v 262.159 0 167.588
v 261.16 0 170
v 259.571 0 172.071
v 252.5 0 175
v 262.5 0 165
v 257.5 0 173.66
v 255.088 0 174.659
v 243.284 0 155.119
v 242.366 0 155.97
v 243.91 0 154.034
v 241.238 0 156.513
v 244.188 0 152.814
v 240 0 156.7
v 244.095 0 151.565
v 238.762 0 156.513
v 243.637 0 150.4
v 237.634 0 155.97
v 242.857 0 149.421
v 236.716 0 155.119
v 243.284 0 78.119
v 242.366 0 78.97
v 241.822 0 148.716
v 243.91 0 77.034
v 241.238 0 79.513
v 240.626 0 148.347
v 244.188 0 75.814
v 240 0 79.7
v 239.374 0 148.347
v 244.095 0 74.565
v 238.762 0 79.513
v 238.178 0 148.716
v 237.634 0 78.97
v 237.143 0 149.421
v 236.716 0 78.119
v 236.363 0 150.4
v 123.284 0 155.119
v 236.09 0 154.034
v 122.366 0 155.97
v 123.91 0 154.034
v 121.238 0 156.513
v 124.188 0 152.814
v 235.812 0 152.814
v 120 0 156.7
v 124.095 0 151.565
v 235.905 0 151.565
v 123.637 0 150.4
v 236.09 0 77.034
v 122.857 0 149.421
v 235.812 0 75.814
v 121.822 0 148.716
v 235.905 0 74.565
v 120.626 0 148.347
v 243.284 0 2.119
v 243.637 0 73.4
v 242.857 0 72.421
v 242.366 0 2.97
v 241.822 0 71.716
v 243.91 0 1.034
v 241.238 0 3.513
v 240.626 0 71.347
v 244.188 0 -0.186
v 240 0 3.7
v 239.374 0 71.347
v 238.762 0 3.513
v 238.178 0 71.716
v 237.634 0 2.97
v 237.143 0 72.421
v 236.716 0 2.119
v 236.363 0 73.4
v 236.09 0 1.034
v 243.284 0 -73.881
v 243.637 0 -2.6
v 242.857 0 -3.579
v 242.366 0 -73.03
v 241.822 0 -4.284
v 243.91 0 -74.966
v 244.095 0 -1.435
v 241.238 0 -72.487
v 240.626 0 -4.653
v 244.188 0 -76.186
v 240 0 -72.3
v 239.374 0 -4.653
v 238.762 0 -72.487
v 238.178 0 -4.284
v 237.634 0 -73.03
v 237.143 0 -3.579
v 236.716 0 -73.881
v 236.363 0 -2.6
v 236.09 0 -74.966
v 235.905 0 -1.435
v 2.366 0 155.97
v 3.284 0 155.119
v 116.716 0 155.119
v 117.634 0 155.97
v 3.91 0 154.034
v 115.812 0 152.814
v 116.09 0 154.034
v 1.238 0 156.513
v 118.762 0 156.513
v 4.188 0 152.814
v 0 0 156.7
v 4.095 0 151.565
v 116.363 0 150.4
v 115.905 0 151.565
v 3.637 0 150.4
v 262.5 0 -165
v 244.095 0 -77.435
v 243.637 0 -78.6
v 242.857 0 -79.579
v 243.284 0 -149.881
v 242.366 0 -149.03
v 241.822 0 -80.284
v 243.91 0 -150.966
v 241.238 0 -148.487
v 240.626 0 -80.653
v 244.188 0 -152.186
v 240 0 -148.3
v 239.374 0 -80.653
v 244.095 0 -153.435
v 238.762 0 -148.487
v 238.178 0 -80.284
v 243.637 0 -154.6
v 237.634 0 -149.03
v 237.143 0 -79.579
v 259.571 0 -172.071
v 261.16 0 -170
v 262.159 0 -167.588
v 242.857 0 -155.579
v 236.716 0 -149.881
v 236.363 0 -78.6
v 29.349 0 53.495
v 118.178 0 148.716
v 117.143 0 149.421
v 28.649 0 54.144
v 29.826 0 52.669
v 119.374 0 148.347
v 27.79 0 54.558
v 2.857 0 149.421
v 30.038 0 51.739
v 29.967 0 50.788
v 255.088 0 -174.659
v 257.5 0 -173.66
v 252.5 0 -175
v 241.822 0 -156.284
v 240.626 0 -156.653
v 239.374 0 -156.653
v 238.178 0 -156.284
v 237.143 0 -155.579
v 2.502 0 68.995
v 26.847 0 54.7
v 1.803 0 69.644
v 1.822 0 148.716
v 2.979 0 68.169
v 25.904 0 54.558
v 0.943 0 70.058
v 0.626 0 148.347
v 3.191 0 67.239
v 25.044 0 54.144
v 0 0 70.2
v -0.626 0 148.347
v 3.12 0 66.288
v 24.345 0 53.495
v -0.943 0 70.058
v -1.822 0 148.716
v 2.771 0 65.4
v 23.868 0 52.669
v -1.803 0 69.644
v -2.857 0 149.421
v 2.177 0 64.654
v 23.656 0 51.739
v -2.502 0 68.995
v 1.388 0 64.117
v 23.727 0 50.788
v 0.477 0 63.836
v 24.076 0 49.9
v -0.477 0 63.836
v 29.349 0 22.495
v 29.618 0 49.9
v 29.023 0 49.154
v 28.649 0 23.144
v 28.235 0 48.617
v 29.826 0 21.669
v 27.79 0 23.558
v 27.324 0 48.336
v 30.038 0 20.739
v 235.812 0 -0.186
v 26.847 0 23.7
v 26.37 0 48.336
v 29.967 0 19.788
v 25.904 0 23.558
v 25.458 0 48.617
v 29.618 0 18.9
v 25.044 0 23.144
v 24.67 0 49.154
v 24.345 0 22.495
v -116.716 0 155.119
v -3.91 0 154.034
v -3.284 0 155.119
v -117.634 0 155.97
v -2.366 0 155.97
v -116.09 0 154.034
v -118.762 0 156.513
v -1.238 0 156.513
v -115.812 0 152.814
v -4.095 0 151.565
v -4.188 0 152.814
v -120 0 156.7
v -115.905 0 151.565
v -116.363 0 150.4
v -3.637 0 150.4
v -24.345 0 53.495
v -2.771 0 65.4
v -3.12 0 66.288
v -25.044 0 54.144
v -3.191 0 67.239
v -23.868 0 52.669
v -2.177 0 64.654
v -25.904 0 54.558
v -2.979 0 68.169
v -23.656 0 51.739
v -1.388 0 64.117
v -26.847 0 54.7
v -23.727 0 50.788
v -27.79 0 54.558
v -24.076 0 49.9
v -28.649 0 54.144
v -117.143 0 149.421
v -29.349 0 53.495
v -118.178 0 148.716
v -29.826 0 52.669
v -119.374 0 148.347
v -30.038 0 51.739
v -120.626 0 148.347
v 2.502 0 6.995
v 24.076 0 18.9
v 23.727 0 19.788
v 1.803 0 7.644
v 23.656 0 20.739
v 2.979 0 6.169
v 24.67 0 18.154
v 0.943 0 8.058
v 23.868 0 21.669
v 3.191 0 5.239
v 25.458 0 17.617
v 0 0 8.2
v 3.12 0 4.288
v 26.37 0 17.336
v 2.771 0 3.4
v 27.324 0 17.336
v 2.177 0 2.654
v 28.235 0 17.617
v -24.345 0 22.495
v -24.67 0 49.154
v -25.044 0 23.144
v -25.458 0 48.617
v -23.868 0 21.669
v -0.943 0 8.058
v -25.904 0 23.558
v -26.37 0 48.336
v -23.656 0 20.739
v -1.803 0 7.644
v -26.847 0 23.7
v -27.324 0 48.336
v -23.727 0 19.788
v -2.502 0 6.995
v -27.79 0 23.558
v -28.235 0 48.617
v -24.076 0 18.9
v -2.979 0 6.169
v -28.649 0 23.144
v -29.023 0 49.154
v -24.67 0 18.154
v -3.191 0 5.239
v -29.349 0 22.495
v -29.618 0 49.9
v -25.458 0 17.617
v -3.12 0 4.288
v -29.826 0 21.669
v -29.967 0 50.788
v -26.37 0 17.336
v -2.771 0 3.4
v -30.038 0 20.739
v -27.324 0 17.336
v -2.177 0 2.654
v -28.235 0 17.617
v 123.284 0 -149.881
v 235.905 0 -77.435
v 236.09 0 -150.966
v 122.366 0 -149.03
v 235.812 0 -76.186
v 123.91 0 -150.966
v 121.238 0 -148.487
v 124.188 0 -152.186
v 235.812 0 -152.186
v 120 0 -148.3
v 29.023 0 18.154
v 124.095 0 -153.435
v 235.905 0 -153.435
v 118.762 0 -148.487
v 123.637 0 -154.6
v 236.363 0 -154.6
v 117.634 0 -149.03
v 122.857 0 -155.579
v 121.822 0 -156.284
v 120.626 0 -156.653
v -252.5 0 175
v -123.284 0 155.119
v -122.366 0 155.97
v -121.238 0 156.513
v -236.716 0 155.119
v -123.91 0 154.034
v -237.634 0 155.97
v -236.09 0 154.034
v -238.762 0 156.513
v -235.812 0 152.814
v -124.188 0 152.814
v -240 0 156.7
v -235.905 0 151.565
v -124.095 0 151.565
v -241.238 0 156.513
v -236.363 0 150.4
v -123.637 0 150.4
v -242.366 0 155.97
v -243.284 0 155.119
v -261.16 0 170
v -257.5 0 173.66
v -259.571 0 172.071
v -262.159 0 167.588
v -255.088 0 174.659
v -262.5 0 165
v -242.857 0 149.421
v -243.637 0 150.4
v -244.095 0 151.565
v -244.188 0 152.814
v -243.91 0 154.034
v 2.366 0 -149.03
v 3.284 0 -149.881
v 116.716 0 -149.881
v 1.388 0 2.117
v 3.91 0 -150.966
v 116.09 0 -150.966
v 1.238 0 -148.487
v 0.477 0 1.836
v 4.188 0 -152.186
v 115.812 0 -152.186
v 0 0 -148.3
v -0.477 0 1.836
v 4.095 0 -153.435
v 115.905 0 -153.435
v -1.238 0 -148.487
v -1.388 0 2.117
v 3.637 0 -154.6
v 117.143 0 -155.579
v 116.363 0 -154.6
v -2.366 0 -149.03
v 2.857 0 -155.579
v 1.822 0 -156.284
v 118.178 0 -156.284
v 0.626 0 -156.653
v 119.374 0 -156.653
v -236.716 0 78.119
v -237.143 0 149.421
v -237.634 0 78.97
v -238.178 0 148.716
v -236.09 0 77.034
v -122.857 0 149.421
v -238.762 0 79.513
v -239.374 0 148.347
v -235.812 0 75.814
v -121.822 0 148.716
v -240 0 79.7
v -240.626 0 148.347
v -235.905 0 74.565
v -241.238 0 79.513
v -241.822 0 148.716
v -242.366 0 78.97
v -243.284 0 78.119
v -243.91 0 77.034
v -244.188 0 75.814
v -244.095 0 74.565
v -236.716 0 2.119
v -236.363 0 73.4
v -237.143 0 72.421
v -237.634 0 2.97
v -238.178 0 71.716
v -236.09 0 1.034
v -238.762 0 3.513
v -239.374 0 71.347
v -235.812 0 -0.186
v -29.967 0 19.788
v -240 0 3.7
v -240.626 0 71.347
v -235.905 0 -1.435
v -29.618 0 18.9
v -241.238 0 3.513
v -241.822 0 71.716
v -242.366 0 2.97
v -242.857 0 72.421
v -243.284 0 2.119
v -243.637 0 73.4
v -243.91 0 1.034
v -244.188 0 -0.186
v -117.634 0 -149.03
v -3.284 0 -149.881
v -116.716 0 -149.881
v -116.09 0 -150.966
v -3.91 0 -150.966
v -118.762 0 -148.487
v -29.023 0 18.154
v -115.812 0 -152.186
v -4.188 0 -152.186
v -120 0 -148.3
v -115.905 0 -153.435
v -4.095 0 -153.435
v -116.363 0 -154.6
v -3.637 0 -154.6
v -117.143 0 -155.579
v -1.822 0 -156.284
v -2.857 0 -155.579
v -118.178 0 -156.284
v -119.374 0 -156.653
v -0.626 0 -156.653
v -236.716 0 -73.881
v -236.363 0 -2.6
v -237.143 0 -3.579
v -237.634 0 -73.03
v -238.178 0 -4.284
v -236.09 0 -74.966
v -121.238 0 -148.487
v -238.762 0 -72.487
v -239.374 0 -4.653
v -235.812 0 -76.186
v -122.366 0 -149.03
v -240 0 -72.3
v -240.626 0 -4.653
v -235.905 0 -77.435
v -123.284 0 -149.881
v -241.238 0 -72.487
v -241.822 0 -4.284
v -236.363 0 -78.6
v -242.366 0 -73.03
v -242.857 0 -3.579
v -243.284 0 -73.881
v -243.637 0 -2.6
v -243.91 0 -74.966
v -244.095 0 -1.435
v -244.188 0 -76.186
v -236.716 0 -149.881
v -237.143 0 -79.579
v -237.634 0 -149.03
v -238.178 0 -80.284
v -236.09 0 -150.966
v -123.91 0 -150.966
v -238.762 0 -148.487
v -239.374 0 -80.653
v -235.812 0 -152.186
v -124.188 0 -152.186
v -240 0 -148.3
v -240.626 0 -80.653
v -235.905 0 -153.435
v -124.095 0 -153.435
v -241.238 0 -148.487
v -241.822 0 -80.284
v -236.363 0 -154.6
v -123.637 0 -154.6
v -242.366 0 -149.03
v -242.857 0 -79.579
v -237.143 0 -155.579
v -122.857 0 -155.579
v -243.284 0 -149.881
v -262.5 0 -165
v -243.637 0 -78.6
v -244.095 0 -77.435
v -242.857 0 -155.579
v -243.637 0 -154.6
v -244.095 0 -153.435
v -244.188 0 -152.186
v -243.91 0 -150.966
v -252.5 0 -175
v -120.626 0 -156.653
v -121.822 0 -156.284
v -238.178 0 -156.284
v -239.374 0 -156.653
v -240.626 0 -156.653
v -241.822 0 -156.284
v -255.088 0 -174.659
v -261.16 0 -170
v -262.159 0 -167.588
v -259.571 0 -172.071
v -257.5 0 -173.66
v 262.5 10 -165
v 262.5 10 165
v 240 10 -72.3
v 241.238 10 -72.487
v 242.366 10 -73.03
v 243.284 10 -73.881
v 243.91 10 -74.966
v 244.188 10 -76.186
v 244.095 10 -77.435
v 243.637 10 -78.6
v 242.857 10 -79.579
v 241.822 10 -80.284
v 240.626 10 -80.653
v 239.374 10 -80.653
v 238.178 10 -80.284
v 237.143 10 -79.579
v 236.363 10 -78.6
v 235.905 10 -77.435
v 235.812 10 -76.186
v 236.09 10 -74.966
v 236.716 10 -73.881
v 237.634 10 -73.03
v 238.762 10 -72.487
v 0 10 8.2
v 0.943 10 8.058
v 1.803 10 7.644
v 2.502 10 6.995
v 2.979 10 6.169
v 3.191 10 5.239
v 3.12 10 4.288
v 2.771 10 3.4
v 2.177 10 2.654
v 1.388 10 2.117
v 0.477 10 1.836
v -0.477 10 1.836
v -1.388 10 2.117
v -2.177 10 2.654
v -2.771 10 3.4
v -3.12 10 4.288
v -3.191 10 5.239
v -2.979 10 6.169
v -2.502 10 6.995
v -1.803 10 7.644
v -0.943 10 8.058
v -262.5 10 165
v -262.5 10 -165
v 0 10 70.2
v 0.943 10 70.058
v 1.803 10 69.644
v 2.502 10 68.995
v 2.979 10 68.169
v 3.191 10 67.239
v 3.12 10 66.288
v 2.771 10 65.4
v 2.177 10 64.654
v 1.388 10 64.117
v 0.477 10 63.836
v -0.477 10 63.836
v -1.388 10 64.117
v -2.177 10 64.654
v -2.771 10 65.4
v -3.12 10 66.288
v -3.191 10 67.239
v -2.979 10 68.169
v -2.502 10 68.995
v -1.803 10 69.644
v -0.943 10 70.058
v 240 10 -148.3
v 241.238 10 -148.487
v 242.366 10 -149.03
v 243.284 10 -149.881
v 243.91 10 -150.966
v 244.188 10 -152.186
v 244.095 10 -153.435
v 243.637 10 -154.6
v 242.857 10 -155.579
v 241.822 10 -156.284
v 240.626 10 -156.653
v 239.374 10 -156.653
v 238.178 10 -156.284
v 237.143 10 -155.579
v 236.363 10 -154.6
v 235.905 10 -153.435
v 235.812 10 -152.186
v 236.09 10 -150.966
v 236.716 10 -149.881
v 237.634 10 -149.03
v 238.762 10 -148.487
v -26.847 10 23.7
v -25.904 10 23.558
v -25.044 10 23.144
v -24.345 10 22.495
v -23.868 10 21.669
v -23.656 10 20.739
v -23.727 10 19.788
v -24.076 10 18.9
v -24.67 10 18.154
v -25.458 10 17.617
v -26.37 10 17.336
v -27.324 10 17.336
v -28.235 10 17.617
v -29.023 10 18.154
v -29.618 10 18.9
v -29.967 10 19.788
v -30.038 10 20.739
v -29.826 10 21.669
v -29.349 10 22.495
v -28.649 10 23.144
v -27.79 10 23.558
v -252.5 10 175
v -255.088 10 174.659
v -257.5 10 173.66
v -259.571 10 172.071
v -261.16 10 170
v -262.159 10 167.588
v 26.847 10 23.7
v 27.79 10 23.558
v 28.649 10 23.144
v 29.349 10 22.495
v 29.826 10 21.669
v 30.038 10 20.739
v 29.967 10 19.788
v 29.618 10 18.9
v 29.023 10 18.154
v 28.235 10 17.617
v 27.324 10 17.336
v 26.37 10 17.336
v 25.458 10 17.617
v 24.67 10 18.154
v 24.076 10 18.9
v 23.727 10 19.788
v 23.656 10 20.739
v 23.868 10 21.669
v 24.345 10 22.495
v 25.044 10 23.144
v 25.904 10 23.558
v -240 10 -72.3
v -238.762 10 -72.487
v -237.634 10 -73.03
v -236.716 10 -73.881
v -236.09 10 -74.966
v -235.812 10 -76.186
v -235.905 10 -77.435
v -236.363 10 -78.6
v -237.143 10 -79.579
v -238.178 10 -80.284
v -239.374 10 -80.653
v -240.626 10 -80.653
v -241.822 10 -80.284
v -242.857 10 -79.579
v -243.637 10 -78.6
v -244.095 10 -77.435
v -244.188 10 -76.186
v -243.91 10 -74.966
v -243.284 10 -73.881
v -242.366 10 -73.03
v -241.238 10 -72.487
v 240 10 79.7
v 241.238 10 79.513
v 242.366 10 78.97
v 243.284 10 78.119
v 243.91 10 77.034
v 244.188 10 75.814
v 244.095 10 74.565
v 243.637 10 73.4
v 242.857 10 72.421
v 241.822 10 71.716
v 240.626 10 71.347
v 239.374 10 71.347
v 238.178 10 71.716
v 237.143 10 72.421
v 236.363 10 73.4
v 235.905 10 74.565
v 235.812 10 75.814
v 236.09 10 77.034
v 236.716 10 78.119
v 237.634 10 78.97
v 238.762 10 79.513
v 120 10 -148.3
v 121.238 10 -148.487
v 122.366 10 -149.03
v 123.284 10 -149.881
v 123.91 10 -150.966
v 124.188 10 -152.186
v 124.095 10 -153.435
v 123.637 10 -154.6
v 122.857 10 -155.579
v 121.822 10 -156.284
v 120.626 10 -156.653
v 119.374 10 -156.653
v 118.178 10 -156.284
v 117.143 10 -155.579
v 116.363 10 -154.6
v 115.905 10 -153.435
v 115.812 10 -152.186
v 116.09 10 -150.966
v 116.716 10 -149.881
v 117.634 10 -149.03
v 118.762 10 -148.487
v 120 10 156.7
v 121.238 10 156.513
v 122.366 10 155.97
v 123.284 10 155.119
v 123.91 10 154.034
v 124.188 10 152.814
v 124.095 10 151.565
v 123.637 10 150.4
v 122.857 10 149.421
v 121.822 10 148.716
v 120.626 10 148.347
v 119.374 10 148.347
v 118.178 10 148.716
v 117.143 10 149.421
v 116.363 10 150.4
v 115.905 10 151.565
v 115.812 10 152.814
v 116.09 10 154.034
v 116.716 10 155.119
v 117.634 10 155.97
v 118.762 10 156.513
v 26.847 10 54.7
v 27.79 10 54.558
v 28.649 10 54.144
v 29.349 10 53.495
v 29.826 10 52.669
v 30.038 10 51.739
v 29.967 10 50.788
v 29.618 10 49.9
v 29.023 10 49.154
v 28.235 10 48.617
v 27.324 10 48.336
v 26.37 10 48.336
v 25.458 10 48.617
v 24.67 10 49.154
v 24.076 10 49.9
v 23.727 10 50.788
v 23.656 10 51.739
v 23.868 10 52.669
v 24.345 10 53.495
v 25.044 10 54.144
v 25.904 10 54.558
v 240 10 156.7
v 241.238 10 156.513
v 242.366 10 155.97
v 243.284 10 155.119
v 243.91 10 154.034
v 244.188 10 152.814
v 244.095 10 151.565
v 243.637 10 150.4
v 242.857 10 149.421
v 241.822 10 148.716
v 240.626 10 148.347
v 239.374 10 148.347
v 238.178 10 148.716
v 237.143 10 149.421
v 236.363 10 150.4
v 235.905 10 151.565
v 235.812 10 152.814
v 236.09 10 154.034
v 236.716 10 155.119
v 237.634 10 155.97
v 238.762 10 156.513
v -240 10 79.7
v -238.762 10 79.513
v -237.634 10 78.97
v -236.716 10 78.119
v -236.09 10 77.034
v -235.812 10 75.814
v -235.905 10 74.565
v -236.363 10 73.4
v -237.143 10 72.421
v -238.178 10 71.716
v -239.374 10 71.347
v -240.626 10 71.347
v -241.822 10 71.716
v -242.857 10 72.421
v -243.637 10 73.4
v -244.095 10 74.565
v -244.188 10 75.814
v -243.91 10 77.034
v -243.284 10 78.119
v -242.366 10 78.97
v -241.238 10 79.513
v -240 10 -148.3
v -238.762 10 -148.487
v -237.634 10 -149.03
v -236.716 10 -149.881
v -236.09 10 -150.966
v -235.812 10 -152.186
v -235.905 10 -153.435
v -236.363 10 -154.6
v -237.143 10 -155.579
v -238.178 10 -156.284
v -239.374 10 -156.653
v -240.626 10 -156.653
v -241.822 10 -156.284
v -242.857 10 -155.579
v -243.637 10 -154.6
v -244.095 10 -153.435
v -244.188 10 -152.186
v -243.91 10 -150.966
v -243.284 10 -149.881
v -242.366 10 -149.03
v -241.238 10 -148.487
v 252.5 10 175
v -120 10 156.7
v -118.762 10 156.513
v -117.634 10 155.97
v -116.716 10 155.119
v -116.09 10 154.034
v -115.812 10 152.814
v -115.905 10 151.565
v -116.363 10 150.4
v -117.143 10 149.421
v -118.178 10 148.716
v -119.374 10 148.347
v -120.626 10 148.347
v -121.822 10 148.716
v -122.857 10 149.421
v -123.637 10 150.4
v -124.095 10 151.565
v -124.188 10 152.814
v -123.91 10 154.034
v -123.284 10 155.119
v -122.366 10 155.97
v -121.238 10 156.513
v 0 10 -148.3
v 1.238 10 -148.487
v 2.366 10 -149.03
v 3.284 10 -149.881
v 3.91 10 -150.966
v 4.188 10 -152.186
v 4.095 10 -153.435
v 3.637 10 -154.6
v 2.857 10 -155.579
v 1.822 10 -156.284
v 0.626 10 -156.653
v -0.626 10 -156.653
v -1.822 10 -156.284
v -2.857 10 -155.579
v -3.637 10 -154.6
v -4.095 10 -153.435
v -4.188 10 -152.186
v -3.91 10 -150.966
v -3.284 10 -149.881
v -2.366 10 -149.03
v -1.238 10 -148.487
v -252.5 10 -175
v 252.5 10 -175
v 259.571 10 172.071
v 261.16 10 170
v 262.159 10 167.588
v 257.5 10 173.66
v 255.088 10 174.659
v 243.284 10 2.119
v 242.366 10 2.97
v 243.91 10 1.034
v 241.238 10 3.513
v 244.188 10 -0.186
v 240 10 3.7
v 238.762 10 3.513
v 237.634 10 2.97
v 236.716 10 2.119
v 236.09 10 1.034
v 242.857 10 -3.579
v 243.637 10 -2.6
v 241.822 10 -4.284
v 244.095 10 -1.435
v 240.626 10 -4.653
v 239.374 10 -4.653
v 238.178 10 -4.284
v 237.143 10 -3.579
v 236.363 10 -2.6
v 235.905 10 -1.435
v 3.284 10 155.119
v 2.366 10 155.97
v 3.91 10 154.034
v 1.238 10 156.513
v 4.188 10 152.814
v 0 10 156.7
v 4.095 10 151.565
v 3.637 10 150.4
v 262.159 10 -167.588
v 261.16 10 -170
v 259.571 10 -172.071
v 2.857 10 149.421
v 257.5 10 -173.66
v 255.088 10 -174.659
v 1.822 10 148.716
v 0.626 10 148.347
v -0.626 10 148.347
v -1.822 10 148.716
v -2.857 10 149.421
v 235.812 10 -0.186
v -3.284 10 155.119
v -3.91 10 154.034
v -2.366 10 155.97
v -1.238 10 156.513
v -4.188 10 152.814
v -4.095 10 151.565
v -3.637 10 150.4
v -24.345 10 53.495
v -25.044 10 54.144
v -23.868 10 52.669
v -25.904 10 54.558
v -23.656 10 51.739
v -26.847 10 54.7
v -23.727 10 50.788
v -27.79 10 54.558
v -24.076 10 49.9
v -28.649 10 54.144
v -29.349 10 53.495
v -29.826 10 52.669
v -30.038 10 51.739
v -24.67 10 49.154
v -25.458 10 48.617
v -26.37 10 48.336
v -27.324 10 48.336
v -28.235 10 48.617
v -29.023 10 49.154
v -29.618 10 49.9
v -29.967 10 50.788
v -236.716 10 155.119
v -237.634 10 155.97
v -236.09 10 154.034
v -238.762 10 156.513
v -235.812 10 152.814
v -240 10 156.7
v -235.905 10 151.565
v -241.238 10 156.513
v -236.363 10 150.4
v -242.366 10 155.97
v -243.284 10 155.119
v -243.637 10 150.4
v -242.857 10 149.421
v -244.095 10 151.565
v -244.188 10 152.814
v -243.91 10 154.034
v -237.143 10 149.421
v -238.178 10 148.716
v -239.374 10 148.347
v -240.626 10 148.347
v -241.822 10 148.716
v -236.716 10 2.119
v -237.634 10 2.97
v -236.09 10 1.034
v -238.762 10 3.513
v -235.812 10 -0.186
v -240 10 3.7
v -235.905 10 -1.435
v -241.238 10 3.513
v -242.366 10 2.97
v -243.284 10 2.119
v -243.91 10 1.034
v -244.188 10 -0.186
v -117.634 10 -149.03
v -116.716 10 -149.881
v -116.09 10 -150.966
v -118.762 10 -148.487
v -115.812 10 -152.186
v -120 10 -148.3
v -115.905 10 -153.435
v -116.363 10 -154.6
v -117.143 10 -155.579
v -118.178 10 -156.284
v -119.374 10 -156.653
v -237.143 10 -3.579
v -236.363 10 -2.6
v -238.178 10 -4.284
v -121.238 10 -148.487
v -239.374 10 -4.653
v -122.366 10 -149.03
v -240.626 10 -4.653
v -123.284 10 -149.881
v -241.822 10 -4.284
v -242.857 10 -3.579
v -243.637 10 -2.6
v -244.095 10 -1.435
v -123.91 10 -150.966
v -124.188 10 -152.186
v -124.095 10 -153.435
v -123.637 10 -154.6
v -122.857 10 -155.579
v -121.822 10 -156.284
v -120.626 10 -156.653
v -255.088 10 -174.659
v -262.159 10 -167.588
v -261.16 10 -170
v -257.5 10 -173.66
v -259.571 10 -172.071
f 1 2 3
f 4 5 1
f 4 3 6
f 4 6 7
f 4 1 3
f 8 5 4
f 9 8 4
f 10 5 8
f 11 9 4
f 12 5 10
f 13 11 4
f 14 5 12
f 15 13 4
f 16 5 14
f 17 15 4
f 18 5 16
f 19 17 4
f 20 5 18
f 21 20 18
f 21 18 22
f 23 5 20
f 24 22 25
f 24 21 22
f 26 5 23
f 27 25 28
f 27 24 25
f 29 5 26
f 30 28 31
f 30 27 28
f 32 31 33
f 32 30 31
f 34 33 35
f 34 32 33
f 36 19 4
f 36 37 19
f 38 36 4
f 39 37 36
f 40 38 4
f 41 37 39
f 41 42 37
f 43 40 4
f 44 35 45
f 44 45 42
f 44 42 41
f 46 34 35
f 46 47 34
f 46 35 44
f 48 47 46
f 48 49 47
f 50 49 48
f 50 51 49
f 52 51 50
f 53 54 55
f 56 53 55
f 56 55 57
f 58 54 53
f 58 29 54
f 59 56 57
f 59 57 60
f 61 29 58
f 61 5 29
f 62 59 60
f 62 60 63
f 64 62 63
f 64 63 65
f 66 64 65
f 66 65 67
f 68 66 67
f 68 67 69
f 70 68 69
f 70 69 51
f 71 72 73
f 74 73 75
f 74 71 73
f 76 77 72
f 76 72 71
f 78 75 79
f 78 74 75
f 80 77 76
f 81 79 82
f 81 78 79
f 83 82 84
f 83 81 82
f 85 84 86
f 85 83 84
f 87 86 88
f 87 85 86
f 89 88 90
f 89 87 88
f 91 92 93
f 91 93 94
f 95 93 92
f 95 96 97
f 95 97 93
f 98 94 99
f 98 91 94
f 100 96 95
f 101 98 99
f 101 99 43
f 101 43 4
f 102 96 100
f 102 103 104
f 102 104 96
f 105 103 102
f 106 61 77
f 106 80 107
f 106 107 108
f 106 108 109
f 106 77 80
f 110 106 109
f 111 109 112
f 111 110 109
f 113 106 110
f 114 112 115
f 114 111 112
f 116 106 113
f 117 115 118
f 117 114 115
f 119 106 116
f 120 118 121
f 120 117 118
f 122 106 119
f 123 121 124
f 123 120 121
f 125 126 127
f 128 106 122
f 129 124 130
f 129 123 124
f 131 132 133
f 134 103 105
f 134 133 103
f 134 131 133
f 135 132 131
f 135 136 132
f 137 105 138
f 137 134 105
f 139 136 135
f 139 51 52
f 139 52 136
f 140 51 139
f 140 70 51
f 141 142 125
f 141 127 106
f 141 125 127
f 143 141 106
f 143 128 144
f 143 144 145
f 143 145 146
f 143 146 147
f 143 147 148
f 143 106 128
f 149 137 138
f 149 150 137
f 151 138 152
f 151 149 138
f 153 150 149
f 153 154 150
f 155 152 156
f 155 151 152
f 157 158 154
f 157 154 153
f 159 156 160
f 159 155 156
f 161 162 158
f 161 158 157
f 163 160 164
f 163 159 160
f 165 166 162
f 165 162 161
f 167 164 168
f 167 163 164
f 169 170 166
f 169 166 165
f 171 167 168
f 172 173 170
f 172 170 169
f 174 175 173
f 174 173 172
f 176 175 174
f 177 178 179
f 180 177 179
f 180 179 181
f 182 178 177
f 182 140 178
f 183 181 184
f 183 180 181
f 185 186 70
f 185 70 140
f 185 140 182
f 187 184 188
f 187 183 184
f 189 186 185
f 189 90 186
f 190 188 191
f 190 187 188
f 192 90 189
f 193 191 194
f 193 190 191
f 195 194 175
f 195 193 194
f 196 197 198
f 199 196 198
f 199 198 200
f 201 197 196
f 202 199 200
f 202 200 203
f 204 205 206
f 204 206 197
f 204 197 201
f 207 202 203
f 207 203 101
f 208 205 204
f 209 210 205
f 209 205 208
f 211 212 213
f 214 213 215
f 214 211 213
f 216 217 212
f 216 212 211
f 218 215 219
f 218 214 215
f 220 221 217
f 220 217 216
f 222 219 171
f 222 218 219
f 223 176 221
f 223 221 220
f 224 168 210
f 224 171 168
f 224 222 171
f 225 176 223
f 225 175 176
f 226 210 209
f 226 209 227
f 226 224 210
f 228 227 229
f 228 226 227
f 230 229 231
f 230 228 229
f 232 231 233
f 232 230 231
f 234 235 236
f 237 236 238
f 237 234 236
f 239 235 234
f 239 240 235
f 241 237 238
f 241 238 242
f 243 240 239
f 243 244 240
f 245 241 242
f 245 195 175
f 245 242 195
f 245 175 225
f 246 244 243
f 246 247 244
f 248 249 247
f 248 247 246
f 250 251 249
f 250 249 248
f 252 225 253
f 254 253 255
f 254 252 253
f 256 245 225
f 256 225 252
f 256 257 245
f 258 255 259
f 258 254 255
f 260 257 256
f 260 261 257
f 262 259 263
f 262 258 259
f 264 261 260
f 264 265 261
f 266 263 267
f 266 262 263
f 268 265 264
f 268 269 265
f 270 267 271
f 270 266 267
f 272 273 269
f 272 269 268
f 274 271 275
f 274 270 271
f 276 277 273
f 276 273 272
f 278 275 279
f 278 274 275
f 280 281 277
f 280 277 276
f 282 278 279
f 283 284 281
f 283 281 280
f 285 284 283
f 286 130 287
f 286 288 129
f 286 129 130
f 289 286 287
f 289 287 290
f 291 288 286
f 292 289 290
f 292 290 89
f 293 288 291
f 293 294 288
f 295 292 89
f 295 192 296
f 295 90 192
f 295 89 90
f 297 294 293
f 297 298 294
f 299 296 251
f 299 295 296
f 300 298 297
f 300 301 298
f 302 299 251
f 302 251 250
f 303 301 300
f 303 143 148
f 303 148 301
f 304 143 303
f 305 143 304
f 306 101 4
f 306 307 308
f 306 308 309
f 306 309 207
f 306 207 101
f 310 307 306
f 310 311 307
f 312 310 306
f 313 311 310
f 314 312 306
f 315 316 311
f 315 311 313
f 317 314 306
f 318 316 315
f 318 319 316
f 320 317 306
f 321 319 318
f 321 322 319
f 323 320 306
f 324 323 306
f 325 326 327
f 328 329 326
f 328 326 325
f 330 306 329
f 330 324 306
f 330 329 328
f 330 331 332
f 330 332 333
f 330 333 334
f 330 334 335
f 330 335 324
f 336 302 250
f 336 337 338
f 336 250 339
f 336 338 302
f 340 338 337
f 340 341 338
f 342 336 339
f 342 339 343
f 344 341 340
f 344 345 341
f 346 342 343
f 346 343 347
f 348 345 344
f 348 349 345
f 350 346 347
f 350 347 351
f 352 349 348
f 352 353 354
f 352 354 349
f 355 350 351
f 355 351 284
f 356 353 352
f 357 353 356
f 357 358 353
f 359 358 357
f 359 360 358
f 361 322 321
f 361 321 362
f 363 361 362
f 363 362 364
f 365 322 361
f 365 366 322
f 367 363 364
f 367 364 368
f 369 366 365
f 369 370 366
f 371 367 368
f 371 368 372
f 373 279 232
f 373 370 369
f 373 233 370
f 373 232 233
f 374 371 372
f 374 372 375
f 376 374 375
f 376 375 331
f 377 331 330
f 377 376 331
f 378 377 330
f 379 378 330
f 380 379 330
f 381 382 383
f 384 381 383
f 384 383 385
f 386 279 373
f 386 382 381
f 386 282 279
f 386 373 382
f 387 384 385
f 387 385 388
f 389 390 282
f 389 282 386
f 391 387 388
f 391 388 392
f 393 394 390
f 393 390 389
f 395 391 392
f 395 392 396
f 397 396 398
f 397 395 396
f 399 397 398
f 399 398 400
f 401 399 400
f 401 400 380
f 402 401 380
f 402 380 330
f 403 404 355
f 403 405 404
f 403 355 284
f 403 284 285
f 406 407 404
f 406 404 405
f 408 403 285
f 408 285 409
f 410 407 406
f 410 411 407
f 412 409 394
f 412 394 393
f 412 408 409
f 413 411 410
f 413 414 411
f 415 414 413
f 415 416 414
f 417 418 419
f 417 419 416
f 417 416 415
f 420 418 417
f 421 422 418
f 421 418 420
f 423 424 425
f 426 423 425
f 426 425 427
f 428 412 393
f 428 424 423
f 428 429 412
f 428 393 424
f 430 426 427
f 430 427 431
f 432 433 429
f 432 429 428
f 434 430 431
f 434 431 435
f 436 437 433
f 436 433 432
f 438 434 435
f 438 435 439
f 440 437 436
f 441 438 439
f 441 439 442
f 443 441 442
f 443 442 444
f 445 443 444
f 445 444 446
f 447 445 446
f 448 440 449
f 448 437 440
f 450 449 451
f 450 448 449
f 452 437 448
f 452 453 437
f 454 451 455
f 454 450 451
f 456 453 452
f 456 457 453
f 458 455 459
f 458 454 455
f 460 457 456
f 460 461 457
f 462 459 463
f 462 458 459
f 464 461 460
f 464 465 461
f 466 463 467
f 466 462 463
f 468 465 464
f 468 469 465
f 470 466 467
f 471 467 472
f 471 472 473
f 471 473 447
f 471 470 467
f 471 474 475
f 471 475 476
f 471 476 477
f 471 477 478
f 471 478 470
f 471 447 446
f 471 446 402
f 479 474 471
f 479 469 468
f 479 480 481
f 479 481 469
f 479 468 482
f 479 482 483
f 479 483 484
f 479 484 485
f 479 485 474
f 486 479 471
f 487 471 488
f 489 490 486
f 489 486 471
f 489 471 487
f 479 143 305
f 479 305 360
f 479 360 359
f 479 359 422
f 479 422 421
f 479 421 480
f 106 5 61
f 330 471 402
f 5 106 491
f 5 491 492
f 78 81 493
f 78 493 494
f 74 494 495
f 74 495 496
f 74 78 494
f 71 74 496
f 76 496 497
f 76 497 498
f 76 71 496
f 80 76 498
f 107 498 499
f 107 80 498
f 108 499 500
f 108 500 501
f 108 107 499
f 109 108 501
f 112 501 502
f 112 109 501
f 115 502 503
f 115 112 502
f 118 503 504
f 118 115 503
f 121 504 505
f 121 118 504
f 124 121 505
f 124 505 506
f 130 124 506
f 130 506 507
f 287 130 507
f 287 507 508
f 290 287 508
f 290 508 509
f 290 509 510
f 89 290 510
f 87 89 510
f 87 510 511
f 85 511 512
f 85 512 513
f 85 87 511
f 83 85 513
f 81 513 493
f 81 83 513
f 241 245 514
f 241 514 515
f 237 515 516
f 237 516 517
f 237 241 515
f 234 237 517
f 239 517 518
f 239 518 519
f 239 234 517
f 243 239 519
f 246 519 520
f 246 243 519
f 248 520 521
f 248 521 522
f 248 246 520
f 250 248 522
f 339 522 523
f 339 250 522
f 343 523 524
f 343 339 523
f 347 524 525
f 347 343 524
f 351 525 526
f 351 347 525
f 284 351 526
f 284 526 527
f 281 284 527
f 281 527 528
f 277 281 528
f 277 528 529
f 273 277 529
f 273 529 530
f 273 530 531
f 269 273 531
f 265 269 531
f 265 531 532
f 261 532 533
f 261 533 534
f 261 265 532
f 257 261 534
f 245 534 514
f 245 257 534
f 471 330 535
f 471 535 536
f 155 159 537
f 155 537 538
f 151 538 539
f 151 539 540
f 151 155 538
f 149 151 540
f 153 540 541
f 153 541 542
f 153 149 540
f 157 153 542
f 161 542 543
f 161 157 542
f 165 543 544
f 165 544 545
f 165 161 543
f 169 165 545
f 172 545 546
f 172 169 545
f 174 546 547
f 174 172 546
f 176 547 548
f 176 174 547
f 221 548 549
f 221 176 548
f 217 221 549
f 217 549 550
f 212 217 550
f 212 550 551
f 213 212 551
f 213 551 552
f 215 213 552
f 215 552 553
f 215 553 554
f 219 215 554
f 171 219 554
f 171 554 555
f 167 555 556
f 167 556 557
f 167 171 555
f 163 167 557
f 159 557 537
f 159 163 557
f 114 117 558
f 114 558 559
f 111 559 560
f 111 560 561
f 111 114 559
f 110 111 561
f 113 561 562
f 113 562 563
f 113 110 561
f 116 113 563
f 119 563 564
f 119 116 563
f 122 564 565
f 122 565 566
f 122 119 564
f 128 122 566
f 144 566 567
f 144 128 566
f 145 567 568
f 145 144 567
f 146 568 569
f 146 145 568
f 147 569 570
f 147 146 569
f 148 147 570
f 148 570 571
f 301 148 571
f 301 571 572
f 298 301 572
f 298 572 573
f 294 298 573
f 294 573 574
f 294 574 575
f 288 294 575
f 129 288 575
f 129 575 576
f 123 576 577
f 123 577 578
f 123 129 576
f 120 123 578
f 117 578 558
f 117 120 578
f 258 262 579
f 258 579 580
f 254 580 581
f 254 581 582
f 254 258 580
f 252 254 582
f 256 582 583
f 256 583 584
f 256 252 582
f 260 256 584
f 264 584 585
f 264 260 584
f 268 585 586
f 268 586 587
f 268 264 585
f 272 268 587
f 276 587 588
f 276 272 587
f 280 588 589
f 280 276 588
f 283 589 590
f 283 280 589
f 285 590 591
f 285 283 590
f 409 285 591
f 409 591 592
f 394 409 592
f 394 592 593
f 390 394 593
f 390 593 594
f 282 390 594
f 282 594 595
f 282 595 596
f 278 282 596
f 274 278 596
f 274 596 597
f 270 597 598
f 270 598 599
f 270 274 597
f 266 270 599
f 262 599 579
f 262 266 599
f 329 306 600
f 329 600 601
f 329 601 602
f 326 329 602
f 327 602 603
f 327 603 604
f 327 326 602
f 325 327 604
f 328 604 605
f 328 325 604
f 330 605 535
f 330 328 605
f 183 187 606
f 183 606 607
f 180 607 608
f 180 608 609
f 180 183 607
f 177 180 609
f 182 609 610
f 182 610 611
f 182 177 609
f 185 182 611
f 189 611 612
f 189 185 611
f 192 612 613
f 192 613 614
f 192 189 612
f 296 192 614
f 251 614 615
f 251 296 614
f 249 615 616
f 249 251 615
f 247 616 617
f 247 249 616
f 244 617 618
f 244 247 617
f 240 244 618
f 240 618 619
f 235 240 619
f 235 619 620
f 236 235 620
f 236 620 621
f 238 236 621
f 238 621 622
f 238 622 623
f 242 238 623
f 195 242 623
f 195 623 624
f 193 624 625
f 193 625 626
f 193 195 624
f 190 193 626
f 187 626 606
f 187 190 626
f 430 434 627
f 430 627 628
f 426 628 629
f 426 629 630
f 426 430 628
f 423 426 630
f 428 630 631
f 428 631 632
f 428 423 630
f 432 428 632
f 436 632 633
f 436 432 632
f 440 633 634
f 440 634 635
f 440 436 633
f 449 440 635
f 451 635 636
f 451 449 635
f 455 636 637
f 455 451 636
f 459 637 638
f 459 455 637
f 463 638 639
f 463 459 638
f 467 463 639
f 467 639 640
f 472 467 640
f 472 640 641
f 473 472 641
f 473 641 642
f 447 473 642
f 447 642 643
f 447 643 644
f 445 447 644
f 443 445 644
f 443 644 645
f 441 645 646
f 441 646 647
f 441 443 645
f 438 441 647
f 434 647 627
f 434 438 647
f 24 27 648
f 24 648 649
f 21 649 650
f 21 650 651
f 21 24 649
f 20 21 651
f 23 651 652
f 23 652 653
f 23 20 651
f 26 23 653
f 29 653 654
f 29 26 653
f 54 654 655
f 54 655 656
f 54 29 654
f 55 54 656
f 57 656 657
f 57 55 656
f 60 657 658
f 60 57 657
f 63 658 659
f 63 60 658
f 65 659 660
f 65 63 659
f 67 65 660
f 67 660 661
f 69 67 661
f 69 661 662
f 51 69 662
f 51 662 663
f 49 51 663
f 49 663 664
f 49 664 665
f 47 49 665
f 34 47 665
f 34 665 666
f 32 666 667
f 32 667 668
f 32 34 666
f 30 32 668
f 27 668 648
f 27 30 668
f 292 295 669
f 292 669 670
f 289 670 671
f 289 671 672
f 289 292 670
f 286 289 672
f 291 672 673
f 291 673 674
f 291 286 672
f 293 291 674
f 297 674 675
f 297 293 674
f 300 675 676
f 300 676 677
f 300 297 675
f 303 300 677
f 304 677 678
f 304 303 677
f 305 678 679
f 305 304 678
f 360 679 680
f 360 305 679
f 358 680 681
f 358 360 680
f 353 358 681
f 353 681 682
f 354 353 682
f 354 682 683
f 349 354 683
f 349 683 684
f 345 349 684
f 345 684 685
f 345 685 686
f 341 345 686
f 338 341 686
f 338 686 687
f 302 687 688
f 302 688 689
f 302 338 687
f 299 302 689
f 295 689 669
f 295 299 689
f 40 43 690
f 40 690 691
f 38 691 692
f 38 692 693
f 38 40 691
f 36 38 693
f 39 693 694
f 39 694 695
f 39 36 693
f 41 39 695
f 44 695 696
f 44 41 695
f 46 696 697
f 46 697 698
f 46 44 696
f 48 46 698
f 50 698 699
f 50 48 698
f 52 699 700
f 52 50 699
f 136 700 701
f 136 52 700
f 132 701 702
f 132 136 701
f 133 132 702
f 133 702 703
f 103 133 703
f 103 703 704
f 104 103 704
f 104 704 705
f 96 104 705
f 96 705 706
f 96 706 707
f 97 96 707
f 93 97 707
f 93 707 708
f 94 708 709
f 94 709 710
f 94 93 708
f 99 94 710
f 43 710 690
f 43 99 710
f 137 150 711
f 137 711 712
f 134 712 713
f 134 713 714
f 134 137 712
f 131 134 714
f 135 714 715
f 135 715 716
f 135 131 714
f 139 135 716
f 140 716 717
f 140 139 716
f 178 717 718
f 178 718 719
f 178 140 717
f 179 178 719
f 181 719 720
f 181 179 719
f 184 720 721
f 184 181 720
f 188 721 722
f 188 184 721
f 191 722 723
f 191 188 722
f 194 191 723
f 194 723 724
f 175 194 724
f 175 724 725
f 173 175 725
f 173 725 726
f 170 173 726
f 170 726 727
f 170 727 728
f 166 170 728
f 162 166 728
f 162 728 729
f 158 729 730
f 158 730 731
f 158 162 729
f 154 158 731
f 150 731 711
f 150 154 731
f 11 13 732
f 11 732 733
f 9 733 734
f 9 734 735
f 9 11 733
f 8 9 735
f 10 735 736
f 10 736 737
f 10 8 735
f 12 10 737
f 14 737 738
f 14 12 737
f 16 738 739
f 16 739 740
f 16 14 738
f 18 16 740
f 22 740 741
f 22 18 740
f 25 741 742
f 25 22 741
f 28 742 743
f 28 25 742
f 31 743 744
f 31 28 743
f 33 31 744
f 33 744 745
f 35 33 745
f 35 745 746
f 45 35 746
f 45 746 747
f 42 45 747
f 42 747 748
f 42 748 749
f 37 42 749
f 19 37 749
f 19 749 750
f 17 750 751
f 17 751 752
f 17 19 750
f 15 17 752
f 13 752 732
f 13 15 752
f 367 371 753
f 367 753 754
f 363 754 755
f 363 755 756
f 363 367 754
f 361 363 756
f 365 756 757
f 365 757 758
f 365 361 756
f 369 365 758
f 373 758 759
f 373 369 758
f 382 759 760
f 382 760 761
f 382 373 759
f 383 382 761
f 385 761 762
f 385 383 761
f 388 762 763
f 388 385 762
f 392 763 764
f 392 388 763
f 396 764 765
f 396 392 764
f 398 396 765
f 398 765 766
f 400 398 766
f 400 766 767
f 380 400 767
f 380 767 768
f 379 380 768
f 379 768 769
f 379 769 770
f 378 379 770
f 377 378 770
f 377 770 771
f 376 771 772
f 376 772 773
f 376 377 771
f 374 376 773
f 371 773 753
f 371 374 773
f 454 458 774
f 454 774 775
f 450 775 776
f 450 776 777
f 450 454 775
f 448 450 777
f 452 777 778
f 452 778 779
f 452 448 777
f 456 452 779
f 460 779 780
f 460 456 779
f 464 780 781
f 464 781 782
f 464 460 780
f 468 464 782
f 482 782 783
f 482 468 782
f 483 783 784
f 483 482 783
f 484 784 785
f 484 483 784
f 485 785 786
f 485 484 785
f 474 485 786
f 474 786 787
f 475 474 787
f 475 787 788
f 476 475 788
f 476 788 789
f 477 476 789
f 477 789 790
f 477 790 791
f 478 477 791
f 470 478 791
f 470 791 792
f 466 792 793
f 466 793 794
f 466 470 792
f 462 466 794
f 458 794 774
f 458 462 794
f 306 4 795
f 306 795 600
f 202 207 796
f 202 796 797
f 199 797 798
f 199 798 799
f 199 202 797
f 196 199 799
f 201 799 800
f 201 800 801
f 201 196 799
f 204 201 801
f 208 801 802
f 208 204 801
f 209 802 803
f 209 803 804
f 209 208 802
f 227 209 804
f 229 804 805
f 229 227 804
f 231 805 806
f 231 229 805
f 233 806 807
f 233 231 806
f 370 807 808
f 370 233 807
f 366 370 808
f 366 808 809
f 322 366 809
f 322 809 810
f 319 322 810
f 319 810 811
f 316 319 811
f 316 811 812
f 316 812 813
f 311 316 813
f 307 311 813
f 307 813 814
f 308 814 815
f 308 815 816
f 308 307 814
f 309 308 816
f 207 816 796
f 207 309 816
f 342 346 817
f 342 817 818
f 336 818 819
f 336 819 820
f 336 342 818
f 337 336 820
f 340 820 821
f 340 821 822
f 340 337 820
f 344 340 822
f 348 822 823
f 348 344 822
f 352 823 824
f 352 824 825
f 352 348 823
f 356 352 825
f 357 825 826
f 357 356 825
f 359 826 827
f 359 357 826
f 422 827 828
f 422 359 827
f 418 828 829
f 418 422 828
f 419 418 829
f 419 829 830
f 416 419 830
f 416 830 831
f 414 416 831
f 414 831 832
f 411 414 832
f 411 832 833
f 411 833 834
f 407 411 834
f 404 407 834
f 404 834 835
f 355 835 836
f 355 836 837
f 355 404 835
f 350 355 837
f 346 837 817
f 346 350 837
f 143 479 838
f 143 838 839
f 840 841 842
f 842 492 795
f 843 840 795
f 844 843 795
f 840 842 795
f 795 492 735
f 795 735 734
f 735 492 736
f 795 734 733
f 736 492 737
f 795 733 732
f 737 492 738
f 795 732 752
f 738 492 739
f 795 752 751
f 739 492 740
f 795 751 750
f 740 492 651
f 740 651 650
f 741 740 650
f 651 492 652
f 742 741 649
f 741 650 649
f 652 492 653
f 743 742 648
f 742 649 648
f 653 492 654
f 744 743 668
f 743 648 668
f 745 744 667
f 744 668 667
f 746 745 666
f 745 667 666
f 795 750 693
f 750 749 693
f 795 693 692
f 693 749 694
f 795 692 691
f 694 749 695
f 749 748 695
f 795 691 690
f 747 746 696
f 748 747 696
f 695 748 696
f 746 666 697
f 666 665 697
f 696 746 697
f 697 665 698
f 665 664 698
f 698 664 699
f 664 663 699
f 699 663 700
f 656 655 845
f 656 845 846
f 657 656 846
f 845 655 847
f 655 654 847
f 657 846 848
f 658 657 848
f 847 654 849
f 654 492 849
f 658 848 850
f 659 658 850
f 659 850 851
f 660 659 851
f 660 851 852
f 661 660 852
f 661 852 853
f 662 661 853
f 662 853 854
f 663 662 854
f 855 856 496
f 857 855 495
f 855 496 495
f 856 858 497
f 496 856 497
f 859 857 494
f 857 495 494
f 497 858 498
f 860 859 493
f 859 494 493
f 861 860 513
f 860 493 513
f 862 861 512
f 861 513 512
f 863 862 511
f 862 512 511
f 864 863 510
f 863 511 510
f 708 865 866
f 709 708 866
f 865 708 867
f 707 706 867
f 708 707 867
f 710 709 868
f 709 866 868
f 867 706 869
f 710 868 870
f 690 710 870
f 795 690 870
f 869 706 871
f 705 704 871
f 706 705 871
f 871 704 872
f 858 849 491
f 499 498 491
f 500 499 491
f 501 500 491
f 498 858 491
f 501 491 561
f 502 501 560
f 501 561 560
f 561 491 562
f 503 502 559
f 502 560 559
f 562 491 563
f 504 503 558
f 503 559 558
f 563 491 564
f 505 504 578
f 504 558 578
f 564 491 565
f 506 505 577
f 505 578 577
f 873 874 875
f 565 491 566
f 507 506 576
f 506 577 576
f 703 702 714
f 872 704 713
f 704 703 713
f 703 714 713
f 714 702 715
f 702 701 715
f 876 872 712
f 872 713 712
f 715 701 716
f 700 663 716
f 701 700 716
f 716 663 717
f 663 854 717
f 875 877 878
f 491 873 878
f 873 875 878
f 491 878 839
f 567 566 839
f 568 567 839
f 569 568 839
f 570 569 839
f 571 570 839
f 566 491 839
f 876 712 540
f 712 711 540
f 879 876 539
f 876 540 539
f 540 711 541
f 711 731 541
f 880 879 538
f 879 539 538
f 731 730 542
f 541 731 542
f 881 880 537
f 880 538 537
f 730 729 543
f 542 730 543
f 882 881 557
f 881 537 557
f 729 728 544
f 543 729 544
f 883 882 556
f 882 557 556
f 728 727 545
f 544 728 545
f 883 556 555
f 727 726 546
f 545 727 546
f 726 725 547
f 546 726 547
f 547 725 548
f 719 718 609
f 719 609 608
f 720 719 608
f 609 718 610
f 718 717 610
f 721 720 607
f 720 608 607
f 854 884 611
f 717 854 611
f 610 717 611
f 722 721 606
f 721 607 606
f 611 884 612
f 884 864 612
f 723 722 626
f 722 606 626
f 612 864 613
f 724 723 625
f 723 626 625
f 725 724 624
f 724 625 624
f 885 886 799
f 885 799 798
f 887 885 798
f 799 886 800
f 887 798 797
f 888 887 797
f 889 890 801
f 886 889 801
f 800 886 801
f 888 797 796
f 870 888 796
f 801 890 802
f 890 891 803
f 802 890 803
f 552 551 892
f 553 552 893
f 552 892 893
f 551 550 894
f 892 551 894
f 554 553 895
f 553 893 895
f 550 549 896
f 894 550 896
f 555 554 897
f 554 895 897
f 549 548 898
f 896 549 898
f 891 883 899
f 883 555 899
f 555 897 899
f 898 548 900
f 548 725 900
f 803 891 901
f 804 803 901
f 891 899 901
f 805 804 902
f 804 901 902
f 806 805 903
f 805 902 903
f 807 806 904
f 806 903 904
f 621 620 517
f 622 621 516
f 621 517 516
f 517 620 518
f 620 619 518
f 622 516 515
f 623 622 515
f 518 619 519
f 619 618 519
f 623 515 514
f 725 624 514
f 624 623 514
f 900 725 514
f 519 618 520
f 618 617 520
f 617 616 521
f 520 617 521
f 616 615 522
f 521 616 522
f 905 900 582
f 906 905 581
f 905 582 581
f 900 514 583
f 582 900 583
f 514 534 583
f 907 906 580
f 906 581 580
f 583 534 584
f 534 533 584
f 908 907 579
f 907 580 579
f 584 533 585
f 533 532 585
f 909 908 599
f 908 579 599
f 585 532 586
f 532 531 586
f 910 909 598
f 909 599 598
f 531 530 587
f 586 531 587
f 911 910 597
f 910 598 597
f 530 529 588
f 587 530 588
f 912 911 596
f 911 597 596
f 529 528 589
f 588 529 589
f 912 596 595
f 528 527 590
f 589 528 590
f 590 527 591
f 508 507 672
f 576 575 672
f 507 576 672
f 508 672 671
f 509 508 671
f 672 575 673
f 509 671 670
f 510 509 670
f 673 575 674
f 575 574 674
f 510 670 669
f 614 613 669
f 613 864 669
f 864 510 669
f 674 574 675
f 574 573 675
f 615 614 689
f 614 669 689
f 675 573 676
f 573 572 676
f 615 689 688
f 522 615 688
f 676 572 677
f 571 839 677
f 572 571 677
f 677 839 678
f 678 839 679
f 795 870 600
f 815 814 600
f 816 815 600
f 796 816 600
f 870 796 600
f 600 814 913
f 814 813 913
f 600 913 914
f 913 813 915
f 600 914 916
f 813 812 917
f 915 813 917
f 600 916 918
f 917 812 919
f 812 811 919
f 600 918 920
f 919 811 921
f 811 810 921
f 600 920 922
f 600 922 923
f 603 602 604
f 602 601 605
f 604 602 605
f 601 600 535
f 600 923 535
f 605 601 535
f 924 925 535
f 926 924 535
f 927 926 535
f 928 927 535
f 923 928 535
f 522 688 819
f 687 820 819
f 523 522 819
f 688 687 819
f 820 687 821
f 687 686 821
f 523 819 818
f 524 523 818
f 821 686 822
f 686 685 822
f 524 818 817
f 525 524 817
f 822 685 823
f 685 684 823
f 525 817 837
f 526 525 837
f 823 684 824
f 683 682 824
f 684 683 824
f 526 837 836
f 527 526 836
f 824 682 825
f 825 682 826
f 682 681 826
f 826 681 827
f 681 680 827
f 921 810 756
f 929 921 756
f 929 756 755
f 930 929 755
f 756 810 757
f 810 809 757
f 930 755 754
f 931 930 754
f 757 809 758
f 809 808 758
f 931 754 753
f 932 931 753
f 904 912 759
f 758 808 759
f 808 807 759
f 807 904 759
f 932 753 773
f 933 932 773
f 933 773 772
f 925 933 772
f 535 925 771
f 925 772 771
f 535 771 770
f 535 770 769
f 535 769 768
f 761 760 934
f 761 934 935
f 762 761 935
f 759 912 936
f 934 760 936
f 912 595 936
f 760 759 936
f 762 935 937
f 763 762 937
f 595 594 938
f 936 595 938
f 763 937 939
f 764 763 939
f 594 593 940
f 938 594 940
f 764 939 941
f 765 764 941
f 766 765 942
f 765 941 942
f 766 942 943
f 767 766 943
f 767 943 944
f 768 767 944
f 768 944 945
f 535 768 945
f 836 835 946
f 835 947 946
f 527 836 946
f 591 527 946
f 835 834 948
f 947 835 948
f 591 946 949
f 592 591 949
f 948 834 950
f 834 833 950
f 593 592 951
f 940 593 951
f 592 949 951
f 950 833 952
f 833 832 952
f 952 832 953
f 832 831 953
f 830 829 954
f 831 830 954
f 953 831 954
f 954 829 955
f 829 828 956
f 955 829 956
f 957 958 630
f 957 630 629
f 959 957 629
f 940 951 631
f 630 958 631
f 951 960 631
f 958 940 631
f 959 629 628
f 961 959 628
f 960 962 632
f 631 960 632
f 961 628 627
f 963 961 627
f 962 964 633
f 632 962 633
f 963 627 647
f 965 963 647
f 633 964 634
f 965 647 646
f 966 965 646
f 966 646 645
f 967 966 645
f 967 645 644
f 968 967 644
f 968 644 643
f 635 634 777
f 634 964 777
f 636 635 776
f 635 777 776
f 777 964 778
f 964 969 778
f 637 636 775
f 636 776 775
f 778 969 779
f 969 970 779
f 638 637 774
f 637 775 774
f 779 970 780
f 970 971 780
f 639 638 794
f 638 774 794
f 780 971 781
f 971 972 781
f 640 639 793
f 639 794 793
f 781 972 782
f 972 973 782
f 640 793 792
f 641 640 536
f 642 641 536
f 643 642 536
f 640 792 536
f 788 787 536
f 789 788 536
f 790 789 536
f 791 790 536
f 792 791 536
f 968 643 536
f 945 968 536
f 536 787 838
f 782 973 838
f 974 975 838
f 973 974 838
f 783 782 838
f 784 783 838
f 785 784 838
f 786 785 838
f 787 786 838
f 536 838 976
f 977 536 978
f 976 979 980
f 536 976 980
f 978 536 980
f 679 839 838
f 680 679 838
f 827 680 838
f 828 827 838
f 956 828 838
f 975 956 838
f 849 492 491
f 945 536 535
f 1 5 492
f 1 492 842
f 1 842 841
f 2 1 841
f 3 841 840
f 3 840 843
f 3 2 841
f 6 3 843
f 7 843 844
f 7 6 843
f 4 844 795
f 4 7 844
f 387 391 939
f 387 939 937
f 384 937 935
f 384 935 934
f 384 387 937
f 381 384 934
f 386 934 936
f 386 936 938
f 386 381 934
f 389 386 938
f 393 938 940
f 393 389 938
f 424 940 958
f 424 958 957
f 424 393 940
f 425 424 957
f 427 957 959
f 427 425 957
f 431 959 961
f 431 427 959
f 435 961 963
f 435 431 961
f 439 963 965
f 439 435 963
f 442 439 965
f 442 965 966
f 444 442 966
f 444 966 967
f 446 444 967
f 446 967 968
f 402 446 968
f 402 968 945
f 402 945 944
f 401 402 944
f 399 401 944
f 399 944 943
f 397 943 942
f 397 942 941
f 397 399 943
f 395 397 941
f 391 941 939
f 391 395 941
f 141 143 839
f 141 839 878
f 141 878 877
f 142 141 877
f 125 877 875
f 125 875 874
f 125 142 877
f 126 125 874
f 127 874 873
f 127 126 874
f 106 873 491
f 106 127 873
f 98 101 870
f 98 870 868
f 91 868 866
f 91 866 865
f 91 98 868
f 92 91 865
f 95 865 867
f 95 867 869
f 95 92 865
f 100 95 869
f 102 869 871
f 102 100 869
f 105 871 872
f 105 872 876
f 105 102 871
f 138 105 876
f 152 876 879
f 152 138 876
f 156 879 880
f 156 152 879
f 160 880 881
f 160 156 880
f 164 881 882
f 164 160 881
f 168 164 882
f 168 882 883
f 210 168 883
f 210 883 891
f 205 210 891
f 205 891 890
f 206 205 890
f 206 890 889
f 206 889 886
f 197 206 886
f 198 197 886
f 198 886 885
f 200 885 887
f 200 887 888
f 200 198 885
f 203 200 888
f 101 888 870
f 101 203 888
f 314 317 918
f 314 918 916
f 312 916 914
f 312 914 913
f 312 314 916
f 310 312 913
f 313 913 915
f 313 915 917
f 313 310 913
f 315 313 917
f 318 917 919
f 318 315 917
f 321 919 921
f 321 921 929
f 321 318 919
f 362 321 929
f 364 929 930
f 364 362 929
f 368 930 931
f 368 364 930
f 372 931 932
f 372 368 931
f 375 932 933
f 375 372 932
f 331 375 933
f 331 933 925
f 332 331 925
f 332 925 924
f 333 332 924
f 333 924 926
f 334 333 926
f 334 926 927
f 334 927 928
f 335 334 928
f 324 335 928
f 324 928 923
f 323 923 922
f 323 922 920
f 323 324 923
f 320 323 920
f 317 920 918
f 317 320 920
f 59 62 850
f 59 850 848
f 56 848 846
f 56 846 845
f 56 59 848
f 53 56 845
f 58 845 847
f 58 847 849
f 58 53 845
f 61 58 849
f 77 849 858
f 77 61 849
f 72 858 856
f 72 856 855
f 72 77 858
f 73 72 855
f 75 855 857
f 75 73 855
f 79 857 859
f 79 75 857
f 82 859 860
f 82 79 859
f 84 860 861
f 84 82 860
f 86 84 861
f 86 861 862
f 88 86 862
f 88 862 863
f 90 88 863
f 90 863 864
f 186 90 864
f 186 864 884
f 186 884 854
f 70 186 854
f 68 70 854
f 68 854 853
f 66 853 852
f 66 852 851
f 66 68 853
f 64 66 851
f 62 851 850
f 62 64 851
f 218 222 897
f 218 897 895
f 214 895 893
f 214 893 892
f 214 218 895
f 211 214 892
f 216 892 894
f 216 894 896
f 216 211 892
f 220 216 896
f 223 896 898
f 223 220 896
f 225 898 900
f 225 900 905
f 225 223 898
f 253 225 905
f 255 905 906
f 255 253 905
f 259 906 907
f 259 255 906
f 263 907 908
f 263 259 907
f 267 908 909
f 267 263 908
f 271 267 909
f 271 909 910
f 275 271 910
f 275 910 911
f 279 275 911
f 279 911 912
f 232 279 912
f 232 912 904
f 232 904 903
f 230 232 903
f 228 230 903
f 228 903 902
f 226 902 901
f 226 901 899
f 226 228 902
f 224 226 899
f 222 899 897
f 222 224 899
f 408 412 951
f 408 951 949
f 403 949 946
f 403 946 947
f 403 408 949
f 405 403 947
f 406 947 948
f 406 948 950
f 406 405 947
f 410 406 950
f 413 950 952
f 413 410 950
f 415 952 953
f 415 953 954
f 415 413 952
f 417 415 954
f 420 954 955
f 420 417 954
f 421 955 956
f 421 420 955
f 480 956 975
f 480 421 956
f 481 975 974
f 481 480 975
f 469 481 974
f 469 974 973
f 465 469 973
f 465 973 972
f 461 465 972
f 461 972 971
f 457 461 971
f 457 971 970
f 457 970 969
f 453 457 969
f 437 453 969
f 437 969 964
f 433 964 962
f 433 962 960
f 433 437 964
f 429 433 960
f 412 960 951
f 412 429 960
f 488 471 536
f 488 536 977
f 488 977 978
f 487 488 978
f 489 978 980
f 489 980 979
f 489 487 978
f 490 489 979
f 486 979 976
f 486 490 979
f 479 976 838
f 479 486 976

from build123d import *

# Parameters (mm, degrees)
SKETCH1_R          = 4.2
SKETCH1_R_2        = 3.2
BASE_FLANGE1_DEPTH = 10


# Sheet-metal steps are written as plain solids
with BuildPart() as part:
    # Sketch1 → Base-Flange1 (new body)
    with BuildSketch(Plane(origin=(0, 0, 0), x_dir=(1, 0, 0), z_dir=(0, 1, 0))):
        with BuildLine():
            Line((-252.5, 175), (252.5, 175))
            ThreePointArc((252.5, 175), (259.571067812, 172.071067812), (262.5, 165))
            Line((262.5, 165), (262.5, -165))
            ThreePointArc((262.5, -165), (259.571067812, -172.071067812), (252.5, -175))
            Line((252.5, -175), (-252.5, -175))
            ThreePointArc((-252.5, -175), (-259.571067812, -172.071067812), (-262.5, -165))
            Line((-262.5, -165), (-262.5, 165))
            ThreePointArc((-262.5, 165), (-259.571067812, 172.071067812), (-252.5, 175))
        make_face()
        with Locations(Location((-240, 152.5, 0), (0, 0, 270))):
            Circle(SKETCH1_R, mode=Mode.SUBTRACT)
        with Locations(Location((-240, 76.5, 0), (0, 0, 270))):
            Circle(SKETCH1_R, mode=Mode.SUBTRACT)
        with Locations(Location((-240, 0.5, 0), (0, 0, 270))):
            Circle(SKETCH1_R, mode=Mode.SUBTRACT)
        with Locations(Location((-240, -75.5, 0), (0, 0, 270))):
            Circle(SKETCH1_R, mode=Mode.SUBTRACT)
        with Locations(Location((240, 152.5, 0), (0, 0, 270))):
            Circle(SKETCH1_R, mode=Mode.SUBTRACT)
        with Locations(Location((240, 76.5, 0), (0, 0, 270))):
            Circle(SKETCH1_R, mode=Mode.SUBTRACT)
        with Locations(Location((240, 0.5, 0), (0, 0, 270))):
            Circle(SKETCH1_R, mode=Mode.SUBTRACT)
        with Locations(Location((240, -75.5, 0), (0, 0, 270))):
            Circle(SKETCH1_R, mode=Mode.SUBTRACT)
        with Locations(Location((0, -5, 0), (0, 0, 270))):
            Circle(SKETCH1_R_2, mode=Mode.SUBTRACT)
        with Locations(Location((-120, 152.5, 0), (0, 0, 270))):
            Circle(SKETCH1_R, mode=Mode.SUBTRACT)
        with Locations(Location((0, 152.5, 0), (0, 0, 270))):
            Circle(SKETCH1_R, mode=Mode.SUBTRACT)
        with Locations(Location((120, 152.5, 0), (0, 0, 270))):
            Circle(SKETCH1_R, mode=Mode.SUBTRACT)
        with Locations(Location((26.846787517, -20.5, 0), (0, 0, 270))):
            Circle(SKETCH1_R_2, mode=Mode.SUBTRACT)
        with Locations(Location((26.846787517, -51.5, 0), (0, 0, 270))):
            Circle(SKETCH1_R_2, mode=Mode.SUBTRACT)
        with Locations(Location((0, -67, 0), (0, 0, 270))):
            Circle(SKETCH1_R_2, mode=Mode.SUBTRACT)
        with Locations(Location((-26.846787517, -51.5, 0), (0, 0, 270))):
            Circle(SKETCH1_R_2, mode=Mode.SUBTRACT)
        with Locations(Location((-26.846787517, -20.5, 0), (0, 0, 270))):
            Circle(SKETCH1_R_2, mode=Mode.SUBTRACT)
        with Locations(Location((-240, -152.5, 0), (0, 0, 270))):
            Circle(SKETCH1_R, mode=Mode.SUBTRACT)
        with Locations(Location((-120, -152.5, 0), (0, 0, 270))):
            Circle(SKETCH1_R, mode=Mode.SUBTRACT)
        with Locations(Location((0, -152.5, 0), (0, 0, 270))):
            Circle(SKETCH1_R, mode=Mode.SUBTRACT)
        with Locations(Location((120, -152.5, 0), (0, 0, 270))):
            Circle(SKETCH1_R, mode=Mode.SUBTRACT)
        with Locations(Location((240, -152.5, 0), (0, 0, 270))):
            Circle(SKETCH1_R, mode=Mode.SUBTRACT)
    extrude(amount=BASE_FLANGE1_DEPTH)


solid = part.part
